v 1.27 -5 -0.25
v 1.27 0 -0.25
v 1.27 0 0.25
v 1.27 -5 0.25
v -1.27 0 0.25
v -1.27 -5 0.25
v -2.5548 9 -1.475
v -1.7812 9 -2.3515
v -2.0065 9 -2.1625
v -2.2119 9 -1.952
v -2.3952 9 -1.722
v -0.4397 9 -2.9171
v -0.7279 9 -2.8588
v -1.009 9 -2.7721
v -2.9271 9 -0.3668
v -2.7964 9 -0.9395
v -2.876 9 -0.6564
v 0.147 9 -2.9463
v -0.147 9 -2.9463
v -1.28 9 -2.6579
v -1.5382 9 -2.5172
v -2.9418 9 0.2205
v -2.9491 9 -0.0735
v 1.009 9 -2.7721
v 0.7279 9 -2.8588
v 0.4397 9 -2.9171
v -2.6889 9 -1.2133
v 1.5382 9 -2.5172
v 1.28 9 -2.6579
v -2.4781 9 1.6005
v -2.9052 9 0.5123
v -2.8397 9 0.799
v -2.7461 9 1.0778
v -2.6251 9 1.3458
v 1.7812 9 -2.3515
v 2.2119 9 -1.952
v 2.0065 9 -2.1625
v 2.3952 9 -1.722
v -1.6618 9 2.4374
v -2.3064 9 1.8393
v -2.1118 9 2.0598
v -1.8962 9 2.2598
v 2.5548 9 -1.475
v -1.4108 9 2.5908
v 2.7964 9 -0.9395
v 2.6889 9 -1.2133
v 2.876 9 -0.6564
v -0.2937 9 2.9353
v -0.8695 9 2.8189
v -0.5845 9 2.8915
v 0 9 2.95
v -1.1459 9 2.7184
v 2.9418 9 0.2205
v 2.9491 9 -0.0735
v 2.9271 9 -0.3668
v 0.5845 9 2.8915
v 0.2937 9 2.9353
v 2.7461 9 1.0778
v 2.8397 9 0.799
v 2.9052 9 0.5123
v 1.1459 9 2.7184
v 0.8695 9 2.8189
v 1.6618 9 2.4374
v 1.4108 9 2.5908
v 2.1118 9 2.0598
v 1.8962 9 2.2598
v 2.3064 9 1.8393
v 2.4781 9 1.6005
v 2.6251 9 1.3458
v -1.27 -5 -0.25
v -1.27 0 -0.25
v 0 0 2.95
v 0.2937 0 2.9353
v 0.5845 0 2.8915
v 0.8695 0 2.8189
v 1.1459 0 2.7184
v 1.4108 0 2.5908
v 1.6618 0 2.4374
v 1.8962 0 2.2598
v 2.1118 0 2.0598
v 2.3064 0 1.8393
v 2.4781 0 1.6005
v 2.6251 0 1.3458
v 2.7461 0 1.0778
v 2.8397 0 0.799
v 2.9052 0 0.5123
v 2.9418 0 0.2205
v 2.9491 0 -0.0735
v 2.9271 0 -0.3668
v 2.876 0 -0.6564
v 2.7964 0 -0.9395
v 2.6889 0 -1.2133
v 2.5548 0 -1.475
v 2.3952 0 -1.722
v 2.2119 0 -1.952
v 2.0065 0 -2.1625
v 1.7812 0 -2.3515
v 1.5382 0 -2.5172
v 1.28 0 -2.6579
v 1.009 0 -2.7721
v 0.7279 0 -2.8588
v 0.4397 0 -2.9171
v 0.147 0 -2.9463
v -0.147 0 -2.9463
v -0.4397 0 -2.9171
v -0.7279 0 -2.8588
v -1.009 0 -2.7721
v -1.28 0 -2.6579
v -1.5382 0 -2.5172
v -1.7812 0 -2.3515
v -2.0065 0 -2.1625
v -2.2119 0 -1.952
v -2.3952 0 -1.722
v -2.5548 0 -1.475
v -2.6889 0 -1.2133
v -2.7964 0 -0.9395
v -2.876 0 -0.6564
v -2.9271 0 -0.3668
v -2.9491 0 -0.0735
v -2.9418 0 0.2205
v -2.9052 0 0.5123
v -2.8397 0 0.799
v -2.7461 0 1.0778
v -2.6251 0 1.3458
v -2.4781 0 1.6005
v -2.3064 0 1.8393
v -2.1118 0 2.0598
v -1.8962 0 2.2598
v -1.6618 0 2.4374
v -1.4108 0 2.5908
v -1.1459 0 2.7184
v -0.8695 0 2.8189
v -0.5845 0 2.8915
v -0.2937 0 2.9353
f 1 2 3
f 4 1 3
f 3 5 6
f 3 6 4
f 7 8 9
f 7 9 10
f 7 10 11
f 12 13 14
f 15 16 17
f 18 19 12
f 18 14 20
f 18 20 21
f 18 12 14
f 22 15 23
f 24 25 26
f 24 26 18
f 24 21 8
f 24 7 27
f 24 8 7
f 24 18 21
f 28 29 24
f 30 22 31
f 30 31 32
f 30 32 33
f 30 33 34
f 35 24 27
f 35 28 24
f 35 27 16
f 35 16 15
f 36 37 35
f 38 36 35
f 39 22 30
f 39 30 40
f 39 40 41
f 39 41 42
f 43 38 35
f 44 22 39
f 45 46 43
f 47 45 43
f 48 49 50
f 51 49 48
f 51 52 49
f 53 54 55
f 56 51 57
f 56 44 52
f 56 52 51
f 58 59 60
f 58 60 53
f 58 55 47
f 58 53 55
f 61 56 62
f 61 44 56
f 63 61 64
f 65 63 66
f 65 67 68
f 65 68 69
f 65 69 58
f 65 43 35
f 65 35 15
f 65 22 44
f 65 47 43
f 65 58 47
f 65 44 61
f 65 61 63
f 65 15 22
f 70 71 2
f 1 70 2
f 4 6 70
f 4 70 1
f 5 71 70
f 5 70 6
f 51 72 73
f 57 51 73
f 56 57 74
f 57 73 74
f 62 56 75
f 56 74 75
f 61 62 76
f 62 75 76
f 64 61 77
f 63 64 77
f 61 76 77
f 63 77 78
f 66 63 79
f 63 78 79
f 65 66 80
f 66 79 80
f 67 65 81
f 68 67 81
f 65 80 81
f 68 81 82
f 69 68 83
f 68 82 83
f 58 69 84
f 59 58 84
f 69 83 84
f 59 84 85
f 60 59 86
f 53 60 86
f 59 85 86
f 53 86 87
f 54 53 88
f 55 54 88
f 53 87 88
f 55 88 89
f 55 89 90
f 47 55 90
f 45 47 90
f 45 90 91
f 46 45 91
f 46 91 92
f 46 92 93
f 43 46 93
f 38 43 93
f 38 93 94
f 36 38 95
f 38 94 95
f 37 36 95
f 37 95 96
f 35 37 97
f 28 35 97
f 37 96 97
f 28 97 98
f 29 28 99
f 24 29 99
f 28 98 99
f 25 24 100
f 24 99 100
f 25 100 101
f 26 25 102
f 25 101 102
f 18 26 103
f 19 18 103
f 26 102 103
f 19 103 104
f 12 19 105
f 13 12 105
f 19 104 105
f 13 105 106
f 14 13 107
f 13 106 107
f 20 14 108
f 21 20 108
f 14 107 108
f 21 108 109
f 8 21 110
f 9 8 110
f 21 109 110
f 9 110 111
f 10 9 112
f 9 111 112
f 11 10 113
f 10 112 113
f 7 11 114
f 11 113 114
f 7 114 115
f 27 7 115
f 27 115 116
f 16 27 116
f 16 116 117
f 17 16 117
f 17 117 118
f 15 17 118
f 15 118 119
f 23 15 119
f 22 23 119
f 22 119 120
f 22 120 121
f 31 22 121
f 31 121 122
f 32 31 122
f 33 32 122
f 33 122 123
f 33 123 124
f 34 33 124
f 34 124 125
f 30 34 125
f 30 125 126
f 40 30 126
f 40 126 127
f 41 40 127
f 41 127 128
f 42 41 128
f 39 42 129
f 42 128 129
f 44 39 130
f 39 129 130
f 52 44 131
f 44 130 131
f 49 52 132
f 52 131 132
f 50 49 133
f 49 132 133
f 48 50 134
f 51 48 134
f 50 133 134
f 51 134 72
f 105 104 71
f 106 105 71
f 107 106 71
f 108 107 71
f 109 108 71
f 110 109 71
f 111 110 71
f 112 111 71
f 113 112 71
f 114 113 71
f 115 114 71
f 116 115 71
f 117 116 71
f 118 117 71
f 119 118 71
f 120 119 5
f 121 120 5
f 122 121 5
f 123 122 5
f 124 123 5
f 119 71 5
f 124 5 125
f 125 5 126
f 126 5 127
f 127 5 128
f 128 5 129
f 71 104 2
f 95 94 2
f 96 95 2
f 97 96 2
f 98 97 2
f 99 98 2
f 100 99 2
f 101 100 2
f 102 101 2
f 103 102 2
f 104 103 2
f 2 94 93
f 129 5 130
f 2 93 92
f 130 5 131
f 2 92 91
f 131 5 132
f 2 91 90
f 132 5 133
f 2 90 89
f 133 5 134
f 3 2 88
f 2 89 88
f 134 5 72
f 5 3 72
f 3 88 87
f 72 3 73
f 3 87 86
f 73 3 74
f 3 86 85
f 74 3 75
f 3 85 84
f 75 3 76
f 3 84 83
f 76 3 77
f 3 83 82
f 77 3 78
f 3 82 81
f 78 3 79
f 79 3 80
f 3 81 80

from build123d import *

# Parameters (mm, degrees)
SKETCH2_R           = 2.95
BOSS_EXTRUDE1_DEPTH = 9
SKETCH3_W           = 2.54
SKETCH3_H           = 0.5
BOSS_EXTRUDE2_DEPTH = 5


with BuildPart() as part:
    # Sketch2 → Boss-Extrude1 (new body)
    with BuildSketch(Plane(origin=(0, 0, 0), x_dir=(1, 0, 0), z_dir=(0, 1, 0))):
        with Locations(Location((0, 0, 0), (0, 0, 270))):
            Circle(SKETCH2_R)
    extrude(amount=BOSS_EXTRUDE1_DEPTH)

    # Sketch3 → Boss-Extrude2 (add)
    with BuildSketch(Plane.XZ):
        Rectangle(SKETCH3_W, SKETCH3_H)
    extrude(amount=BOSS_EXTRUDE2_DEPTH)


solid = part.part
